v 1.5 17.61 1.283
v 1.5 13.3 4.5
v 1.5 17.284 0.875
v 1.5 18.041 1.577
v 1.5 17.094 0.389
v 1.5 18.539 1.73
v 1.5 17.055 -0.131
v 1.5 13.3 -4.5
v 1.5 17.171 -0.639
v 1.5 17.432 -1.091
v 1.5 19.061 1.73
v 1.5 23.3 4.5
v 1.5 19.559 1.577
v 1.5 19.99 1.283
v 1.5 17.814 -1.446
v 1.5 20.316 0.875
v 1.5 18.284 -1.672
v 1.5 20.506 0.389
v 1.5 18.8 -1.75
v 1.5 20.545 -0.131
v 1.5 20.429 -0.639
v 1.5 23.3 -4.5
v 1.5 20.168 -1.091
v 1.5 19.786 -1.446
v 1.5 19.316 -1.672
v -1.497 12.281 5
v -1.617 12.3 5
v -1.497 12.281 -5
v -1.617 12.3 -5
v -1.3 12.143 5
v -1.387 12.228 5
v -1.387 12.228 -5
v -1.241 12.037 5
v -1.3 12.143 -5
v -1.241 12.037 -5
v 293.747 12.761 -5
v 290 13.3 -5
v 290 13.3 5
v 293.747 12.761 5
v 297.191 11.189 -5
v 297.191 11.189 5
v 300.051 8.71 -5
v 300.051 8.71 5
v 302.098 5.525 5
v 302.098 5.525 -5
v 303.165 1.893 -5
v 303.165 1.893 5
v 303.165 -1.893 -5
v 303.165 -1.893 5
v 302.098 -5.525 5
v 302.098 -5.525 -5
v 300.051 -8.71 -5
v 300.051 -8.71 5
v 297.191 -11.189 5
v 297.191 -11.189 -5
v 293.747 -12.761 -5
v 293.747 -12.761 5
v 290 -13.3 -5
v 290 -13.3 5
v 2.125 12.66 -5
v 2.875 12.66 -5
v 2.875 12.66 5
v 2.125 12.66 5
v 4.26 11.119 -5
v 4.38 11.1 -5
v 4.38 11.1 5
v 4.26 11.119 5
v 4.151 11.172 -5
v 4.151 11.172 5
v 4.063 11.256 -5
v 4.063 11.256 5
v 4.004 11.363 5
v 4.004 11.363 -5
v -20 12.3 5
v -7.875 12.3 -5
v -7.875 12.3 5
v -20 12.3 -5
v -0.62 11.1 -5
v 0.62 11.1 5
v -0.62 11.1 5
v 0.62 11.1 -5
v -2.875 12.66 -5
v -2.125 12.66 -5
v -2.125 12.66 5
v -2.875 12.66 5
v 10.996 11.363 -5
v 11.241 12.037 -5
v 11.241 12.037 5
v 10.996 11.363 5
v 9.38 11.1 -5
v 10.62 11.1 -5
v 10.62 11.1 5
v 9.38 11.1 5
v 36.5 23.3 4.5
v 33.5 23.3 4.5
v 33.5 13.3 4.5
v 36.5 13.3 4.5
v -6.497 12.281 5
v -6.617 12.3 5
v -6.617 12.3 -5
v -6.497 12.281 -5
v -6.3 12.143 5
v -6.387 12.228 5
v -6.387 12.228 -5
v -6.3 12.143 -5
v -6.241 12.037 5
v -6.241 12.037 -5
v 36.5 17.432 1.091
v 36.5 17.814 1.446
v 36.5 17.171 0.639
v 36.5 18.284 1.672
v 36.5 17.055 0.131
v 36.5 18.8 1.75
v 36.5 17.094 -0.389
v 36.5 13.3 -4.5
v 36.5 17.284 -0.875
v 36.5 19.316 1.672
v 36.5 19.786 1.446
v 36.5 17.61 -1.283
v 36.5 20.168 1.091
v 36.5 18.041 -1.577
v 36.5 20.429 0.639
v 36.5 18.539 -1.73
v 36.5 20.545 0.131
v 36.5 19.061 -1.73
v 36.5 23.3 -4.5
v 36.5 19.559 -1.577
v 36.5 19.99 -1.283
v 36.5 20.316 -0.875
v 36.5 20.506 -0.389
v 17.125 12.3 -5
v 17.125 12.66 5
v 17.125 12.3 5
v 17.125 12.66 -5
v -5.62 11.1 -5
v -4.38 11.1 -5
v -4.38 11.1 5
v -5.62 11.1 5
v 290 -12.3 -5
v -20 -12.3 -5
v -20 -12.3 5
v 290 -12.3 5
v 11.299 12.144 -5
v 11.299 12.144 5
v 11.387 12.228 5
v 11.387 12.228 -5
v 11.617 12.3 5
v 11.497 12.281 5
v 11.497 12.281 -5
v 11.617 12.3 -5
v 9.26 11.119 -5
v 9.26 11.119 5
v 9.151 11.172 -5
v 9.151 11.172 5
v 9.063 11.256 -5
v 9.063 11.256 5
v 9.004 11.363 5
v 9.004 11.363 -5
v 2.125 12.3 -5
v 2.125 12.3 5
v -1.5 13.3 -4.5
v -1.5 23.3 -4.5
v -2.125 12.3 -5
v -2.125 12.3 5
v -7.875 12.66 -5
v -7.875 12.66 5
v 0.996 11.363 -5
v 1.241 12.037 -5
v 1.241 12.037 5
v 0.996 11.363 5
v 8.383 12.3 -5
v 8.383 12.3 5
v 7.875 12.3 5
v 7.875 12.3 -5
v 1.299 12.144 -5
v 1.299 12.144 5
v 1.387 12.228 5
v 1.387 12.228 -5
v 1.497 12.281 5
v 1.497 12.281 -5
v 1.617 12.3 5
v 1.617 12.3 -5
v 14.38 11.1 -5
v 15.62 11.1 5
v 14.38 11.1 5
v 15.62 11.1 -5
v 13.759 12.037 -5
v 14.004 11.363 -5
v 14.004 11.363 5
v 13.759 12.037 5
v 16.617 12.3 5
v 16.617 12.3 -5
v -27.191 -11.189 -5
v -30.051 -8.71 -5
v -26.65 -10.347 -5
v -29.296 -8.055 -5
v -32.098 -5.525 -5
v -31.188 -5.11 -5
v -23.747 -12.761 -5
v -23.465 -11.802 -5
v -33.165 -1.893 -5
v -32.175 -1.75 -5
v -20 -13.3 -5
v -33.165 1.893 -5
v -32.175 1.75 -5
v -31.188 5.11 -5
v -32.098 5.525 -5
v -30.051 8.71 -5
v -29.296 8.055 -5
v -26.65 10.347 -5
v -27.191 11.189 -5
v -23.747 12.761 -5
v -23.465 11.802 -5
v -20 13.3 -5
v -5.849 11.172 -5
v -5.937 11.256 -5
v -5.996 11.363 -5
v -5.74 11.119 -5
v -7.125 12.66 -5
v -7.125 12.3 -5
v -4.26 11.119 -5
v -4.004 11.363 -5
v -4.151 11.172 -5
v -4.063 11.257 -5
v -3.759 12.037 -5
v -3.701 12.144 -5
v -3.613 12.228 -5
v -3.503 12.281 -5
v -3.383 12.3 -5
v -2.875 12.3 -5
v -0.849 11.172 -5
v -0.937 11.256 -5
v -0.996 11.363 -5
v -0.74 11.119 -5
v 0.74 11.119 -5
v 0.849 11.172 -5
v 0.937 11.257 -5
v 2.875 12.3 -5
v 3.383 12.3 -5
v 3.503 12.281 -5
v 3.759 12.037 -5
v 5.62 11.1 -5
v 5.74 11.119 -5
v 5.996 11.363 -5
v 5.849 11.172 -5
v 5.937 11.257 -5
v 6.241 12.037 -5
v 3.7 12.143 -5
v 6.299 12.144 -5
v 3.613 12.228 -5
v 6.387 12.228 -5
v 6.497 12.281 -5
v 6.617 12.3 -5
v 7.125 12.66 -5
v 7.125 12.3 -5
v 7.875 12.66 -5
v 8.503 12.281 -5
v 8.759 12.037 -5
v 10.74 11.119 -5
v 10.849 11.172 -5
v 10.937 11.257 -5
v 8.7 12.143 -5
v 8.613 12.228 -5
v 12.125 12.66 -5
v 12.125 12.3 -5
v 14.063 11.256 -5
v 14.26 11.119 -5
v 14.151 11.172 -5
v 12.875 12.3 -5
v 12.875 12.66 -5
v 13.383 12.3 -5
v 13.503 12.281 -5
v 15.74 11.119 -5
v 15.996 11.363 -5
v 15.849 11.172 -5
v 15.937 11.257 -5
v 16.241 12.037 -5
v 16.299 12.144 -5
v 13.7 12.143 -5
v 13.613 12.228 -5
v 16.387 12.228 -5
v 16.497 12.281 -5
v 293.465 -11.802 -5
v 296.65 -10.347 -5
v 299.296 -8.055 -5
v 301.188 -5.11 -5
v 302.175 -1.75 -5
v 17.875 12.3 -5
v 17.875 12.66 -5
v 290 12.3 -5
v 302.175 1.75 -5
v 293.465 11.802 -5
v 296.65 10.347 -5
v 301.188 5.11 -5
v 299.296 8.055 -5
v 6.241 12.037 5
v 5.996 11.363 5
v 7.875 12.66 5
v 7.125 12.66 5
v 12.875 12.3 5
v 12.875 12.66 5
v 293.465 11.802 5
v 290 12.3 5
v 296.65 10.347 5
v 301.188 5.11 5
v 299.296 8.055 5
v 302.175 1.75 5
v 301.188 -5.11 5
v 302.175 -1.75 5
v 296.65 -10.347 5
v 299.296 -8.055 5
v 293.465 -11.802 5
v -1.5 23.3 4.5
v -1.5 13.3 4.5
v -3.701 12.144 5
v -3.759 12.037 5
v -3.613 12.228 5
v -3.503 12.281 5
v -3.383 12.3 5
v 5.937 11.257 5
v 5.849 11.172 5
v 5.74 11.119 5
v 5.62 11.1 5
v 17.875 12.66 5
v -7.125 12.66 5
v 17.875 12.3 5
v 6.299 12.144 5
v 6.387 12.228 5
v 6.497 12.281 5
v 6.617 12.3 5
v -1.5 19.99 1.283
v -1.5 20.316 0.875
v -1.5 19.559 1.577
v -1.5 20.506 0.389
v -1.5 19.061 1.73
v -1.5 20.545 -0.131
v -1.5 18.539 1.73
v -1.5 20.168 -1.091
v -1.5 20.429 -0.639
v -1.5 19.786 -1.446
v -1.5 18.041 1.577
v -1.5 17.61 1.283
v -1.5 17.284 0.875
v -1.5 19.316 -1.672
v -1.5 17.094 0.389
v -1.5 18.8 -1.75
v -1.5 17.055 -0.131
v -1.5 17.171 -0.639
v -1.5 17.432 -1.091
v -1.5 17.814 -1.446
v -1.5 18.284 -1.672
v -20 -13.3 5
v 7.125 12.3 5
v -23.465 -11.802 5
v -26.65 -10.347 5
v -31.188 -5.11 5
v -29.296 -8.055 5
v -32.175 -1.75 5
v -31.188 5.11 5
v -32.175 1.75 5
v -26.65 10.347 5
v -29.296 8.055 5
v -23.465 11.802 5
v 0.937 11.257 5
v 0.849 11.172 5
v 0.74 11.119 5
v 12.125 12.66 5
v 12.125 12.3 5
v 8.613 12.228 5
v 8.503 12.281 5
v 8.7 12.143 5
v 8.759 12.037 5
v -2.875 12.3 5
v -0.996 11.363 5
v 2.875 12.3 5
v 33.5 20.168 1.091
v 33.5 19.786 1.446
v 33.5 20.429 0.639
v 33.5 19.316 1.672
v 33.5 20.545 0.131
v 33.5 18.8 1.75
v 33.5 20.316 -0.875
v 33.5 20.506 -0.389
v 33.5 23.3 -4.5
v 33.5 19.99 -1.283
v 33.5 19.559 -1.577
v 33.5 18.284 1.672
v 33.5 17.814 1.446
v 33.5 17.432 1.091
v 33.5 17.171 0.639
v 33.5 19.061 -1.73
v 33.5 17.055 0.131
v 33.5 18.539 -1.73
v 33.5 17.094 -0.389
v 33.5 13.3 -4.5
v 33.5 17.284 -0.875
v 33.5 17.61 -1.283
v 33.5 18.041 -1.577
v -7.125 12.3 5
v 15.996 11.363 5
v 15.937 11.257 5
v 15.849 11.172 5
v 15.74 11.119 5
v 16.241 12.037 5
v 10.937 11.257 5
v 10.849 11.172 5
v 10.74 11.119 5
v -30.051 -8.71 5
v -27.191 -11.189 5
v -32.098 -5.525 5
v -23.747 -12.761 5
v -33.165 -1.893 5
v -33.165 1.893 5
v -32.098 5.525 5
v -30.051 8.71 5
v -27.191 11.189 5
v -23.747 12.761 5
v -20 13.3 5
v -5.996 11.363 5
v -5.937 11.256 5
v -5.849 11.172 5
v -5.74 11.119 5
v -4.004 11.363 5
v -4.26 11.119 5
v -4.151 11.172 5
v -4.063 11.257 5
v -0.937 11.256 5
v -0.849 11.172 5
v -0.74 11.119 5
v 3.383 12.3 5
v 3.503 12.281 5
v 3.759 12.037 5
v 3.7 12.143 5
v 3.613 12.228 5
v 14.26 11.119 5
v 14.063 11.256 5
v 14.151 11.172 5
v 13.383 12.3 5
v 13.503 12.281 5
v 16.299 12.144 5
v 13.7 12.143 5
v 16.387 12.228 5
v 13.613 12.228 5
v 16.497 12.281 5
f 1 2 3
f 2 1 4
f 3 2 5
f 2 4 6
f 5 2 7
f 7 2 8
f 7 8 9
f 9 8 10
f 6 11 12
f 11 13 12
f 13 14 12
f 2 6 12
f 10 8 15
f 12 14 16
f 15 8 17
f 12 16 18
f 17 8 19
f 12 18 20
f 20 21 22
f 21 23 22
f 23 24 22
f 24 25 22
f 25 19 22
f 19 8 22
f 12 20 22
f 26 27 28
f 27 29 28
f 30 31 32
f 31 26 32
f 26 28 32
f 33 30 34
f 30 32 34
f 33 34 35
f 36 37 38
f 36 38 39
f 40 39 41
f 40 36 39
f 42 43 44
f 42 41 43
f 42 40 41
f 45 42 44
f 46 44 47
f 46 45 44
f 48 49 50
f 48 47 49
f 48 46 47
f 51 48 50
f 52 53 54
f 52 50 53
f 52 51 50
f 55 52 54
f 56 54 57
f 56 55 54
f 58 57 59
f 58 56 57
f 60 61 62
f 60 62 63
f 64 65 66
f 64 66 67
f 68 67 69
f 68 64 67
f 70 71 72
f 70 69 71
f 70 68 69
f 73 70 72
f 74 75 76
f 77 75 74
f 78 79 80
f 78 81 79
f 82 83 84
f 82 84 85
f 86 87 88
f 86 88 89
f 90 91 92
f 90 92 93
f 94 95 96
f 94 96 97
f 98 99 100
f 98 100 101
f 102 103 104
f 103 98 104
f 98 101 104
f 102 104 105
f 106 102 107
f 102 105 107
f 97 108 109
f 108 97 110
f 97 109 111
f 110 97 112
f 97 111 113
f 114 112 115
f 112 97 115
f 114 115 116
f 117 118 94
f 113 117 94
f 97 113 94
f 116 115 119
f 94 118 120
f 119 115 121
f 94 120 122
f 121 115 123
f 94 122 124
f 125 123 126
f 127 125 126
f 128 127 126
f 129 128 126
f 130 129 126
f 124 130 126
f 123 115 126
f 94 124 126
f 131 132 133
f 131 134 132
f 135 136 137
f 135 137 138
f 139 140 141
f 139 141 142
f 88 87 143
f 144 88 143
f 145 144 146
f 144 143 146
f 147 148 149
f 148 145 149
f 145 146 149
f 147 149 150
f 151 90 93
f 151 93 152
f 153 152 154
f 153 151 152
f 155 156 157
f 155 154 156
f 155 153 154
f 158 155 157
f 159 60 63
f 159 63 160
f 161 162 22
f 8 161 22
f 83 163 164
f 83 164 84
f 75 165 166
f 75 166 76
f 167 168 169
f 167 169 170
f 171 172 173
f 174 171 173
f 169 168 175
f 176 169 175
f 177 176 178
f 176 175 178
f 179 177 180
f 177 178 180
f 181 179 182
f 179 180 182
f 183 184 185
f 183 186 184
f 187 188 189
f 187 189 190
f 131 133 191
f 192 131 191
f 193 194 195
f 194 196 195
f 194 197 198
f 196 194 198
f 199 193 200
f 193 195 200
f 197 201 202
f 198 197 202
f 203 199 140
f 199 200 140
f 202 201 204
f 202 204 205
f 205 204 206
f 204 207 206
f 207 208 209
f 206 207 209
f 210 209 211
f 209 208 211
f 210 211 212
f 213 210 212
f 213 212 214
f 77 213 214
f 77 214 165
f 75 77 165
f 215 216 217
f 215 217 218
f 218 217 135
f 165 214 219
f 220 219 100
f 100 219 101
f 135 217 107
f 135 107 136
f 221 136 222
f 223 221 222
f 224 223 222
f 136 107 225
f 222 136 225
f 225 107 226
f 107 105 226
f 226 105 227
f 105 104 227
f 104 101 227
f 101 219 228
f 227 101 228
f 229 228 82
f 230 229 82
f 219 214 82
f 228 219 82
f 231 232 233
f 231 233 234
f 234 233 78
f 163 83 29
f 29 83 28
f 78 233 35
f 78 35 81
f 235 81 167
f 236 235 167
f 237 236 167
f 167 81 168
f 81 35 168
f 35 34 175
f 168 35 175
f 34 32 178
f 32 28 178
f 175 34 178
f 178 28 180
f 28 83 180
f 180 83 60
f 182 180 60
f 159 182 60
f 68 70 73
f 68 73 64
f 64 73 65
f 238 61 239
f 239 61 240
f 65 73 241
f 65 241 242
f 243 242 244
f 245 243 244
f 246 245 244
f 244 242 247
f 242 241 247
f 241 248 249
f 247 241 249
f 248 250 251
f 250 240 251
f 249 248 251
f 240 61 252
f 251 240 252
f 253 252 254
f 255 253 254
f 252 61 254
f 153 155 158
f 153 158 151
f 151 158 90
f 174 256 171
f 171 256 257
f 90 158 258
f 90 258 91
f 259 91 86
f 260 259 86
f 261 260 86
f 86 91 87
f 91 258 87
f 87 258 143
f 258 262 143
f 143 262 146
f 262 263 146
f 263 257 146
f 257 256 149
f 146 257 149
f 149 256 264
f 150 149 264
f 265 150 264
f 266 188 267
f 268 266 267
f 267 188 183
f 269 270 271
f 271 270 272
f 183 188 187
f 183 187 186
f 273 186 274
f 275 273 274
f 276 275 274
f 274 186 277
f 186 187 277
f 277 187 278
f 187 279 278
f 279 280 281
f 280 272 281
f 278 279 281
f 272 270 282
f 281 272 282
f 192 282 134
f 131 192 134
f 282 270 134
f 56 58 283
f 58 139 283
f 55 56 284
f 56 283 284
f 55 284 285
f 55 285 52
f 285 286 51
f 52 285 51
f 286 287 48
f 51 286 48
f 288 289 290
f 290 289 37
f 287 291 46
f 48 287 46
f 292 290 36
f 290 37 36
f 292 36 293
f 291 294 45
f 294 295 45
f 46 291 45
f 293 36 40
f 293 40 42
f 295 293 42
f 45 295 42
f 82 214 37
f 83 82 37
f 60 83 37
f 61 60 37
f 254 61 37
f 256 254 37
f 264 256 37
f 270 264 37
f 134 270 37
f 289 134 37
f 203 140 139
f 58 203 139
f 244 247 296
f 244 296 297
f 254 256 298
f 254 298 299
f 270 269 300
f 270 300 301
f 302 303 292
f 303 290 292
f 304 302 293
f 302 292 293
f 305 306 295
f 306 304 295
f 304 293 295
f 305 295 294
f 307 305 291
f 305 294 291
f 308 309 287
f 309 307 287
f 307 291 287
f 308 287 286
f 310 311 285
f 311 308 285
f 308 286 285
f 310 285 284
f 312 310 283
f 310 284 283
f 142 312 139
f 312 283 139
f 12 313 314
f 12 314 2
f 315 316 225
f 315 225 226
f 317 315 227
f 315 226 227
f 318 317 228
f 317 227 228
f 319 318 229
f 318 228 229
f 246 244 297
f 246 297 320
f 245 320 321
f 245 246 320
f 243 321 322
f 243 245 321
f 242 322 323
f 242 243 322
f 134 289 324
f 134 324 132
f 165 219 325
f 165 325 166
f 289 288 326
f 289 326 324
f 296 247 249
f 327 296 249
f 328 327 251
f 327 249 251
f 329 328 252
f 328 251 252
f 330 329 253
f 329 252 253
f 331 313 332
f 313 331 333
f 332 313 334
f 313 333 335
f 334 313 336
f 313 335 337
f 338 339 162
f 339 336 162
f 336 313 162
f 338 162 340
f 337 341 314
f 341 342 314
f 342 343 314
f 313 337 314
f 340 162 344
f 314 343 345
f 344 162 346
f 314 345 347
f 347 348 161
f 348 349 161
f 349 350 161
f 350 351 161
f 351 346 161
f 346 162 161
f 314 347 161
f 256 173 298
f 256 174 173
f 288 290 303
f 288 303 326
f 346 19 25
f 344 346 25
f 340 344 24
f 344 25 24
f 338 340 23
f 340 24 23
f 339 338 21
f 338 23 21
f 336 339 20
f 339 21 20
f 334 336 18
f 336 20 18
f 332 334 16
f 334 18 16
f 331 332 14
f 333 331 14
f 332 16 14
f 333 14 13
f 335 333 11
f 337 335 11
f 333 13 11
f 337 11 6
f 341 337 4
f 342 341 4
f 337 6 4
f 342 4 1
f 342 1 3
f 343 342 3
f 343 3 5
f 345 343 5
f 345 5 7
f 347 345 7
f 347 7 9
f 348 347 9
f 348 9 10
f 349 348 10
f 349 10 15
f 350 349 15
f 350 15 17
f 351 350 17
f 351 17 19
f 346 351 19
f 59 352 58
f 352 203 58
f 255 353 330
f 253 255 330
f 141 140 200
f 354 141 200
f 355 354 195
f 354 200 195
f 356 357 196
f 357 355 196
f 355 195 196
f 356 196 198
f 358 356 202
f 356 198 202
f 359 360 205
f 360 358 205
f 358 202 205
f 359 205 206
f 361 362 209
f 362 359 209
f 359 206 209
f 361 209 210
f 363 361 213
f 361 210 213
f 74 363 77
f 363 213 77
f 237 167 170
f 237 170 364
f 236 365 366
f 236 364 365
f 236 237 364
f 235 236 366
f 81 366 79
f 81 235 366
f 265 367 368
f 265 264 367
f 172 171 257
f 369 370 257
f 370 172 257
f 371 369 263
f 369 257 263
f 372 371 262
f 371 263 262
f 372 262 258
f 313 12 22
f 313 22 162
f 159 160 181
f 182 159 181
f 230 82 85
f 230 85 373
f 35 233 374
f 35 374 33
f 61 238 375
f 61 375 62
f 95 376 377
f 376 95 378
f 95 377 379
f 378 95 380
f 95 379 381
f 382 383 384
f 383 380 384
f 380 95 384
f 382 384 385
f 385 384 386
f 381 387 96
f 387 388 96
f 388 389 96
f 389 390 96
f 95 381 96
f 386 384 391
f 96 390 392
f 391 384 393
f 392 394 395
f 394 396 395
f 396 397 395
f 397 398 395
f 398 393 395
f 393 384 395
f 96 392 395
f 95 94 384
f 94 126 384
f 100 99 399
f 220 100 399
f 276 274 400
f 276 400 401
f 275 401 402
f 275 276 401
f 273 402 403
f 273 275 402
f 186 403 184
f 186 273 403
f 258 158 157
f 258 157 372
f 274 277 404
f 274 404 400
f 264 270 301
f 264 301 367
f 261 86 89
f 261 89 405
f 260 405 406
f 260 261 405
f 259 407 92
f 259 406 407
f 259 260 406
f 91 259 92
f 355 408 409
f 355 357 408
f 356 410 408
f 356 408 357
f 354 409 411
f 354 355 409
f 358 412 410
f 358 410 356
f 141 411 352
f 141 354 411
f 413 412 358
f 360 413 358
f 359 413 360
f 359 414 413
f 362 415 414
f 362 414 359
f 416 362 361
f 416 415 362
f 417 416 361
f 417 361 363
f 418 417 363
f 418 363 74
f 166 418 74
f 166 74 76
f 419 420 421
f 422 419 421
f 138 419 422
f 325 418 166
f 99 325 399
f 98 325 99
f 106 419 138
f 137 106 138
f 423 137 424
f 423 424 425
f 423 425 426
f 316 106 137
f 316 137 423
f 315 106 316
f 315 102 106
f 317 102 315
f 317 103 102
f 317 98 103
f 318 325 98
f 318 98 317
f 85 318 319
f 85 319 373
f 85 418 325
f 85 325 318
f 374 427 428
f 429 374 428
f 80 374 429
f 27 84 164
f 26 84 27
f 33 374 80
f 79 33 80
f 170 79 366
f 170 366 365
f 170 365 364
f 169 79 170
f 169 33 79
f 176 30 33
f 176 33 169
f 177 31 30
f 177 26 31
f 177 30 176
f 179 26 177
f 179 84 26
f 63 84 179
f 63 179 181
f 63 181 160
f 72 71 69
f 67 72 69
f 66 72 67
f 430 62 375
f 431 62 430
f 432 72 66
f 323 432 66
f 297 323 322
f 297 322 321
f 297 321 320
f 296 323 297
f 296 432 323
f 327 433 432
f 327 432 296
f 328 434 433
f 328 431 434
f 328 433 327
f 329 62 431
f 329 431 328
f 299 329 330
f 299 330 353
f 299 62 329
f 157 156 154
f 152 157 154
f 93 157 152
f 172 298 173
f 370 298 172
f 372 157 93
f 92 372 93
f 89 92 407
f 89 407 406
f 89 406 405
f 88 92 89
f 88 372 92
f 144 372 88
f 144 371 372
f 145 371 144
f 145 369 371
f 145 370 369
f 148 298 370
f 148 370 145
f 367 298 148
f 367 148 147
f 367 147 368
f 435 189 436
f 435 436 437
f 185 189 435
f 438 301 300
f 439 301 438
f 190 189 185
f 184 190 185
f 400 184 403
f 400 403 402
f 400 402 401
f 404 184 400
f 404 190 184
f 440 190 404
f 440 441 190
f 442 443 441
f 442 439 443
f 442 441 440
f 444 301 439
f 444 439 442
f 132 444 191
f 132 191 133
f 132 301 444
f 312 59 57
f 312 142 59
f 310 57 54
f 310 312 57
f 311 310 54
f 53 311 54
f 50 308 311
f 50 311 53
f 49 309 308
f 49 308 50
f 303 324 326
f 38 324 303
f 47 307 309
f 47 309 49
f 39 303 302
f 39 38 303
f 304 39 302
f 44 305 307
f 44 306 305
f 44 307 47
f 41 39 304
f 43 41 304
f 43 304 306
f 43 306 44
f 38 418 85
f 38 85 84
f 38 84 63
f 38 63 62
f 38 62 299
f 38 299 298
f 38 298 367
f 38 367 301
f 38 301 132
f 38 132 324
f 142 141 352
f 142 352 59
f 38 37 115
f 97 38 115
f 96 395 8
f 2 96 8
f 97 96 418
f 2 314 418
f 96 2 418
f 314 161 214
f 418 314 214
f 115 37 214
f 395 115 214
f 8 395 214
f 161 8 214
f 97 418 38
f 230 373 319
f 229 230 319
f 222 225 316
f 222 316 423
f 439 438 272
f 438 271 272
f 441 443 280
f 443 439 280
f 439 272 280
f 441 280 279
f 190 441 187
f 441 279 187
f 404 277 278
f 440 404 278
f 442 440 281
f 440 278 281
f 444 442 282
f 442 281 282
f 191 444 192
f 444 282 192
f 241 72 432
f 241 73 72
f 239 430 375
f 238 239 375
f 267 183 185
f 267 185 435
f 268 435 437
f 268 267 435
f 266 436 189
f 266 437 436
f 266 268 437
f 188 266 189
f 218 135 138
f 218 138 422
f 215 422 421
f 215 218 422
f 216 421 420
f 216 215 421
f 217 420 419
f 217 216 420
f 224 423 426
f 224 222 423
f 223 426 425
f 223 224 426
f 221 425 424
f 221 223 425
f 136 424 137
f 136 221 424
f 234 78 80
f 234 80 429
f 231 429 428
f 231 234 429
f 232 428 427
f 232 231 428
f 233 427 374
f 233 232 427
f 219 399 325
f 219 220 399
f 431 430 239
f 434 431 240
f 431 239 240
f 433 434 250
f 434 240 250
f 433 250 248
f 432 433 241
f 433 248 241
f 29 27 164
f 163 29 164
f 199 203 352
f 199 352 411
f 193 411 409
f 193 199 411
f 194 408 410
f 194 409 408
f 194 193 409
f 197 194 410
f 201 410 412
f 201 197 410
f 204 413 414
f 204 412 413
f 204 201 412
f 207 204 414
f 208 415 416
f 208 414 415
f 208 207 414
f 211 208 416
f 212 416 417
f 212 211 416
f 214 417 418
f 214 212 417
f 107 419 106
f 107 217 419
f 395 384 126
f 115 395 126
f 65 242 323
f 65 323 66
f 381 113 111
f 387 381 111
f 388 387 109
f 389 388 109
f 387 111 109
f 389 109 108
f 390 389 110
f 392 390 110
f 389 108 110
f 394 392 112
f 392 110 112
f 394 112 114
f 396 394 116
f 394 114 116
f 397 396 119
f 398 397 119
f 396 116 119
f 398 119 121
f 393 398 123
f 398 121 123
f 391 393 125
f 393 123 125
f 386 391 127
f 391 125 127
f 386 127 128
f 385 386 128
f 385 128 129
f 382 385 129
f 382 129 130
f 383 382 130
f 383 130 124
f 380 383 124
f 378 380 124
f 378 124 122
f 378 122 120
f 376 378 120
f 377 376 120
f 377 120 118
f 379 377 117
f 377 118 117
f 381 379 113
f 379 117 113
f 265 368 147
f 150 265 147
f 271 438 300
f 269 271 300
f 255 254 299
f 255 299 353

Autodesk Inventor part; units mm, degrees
ref_plane "YZ Plane" through (0, 0, 0) normal (1, 0, 0) x (0, 1, 0)
ref_plane "XZ Plane" through (0, 0, 0) normal (0, 1, 0) x (-1, 0, 0)
ref_plane "XY Plane" through (0, 0, 0) normal (0, 0, 1) x (1, 0, 0)
sketch "Sketch_2" plane through (0, 0, 0) normal (0, 0, 1) x (1, 0, 0)
  arc A0 (-20, 13.3) -> (-20, -13.3) centre (-20, 0) ccw
  line L0 (-20, -13.3) -> (290, -13.3)
  arc A1 (290, -13.3) -> (290, 13.3) centre (290, 0) ccw
  line L1 (290, 13.3) -> (-20, 13.3)
extrude "Extrusion1" add sketch "Sketch_2" along normal mid plane 10
sketch "Sketch_8" plane through (0, 0, 0) normal (0, 0, 1) x (1, 0, 0)
  line L0 (-1.5, 23.3) -> (-1.5, 13.3)
  line L1 (-1.5, 13.3) -> (1.5, 13.3)
  line L2 (1.5, 13.3) -> (1.5, 23.3)
  line L3 (1.5, 23.3) -> (-1.5, 23.3)
extrude "Extrusion2" add sketch "Sketch_8" along normal mid plane 9
sketch "_____3" plane through (0, 0, 0) normal (1, 0, 0) x (0, 0, -1)
  circle A0 centre (0, 18.8) radius 1.75
extrude "Extrusion3" cut sketch "_____3" along normal mid plane 6
sketch "_____2" plane through (0, 0, 0) normal (0, 0, 1) x (1, 0, 0)
  line L0 (33.5, 8.3) -> (36.5, 8.3)
  line L1 (36.5, 8.3) -> (36.5, 23.3)
  line L2 (36.5, 23.3) -> (33.5, 23.3)
  line L3 (33.5, 23.3) -> (33.5, 8.3)
extrude "Extrusion4" add sketch "_____2" along normal mid plane 9
sketch "Sketch5" plane through (33.5, 13.3, 4.5) normal (-1, 0, 0) x (0, 0, 1)
  point P0 (-4.5, 5.5)
hole "Hole1" at (33.5, 18.8, 0) direction (1, 0, 0) diameter 3.5 depth 3
sketch "Sketch_4" plane through (0, 0, 0) normal (0, 0, 1) x (1, 0, 0)
  arc A0 (-20, 12.3) -> (-20, -12.3) centre (-20, 0) ccw
  line L0 (-20, -12.3) -> (290, -12.3)
  arc A1 (290, -12.3) -> (290, 12.3) centre (290, 0) ccw
  line L1 (290, 12.3) -> (17.5, 12.3)
  line L2 (17.5, 12.3) -> (17.5, 11.1)
  line L3 (17.5, 11.1) -> (-7.5, 11.1)
  line L4 (-7.5, 11.1) -> (-7.5, 12.3)
  line L5 (-7.5, 12.3) -> (-20, 12.3)
extrude "Extrusion5" cut sketch "Sketch_4" along normal mid plane 10
sketch "Sketch_64" plane through (0, 0, 0) normal (0, 0, 1) x (1, 0, 0)
  line L0 (-9.3801, 11.1) -> (-9.3801, 10.1)
  line L1 (-9.3801, 10.1) -> (-5.6199, 10.1)
  line L2 (-5.6199, 10.1) -> (-5.6199, 11.1)
  arc A0 (-5.9958, 11.3632) -> (-5.6199, 11.1) centre (-5.6199, 11.5) ccw
  line L3 (-5.9958, 11.3632) -> (-6.241, 12.0368)
  arc A1 (-6.241, 12.0368) -> (-6.6168, 12.3) centre (-6.6168, 11.9) ccw
  line L4 (-6.6168, 12.3) -> (-7.125, 12.3)
  line L5 (-7.125, 12.3) -> (-7.125, 12.66)
  line L6 (-7.125, 12.66) -> (-7.875, 12.66)
  line L7 (-7.875, 12.66) -> (-7.875, 12.3)
  line L8 (-7.875, 12.3) -> (-8.3832, 12.3)
  arc A2 (-8.3832, 12.3) -> (-8.759, 12.0368) centre (-8.3832, 11.9) ccw
  line L9 (-8.759, 12.0368) -> (-9.0042, 11.3632)
  arc A3 (-9.3801, 11.1) -> (-9.0042, 11.3632) centre (-9.3801, 11.5) ccw
extrude "Extrusion6" cut sketch "Sketch_64" along normal mid plane 10
pattern_linear "Rectangular Pattern1" count 6 spacing 5 along (1, 0, 0) of "Extrusion6"
properties part number "ATBT-700T5100-B-P35_info-1-16-16"
